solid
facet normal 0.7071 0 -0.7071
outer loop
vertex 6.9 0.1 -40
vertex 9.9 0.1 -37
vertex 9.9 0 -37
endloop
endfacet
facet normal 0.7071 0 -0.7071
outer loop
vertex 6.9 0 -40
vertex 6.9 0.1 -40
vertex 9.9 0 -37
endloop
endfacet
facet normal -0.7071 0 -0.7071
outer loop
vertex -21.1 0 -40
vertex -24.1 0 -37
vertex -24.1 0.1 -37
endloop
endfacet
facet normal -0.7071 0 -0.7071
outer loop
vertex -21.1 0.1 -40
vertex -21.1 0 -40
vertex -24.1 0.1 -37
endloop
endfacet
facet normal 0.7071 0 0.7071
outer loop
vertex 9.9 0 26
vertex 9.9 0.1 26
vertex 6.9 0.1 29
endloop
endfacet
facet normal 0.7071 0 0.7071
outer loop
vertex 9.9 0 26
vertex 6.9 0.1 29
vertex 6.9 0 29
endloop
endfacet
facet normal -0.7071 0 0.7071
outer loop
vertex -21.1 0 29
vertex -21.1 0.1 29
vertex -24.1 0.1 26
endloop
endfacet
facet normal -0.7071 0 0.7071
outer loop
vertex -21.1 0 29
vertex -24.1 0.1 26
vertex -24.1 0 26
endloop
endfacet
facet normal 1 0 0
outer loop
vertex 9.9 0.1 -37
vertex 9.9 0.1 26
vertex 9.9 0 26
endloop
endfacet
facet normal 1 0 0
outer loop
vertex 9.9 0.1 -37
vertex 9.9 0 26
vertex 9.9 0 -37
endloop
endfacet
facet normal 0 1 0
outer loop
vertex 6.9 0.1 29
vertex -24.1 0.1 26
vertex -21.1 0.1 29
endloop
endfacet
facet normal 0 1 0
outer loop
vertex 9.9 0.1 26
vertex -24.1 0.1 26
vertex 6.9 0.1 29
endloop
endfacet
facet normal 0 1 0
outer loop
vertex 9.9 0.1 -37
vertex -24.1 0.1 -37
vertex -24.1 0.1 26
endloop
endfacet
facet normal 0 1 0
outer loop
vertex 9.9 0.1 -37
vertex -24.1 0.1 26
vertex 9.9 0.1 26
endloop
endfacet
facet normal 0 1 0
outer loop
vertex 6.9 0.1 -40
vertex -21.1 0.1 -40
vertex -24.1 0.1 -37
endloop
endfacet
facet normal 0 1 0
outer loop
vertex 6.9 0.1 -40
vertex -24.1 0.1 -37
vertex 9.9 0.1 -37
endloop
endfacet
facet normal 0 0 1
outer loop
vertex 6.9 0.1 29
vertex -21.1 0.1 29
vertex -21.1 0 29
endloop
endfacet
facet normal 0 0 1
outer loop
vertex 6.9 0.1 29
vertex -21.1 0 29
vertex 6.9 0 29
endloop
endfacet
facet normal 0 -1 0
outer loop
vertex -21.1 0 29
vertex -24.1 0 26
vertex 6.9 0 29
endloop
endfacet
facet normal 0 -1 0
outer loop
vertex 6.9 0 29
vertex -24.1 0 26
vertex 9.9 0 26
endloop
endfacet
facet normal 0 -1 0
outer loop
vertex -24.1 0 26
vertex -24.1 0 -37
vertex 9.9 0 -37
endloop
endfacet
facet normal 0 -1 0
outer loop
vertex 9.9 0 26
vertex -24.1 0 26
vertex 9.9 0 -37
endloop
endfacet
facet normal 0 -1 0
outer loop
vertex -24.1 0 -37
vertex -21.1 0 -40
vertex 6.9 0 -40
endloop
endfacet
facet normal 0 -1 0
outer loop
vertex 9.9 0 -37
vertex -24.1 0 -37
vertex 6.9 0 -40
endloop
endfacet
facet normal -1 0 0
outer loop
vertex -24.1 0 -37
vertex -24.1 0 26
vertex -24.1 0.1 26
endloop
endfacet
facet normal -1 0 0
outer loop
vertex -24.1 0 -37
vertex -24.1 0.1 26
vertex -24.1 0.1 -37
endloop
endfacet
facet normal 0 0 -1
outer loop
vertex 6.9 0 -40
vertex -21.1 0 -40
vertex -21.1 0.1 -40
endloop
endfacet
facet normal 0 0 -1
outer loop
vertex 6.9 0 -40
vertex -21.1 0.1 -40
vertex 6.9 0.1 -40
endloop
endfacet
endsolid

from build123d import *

# Parameters (mm, degrees)
SKETCH1_W           = 48.2
SKETCH1_H           = 80
BOSS_EXTRUDE1_DEPTH = 0.1
CUT_EXTRUDE1_DEPTH  = 1.1
CHAMFER1_SIZE       = 3


with BuildPart() as part:
    # Sketch1 → Boss-Extrude1 (new body)
    with BuildSketch(Plane(origin=(0, 0, 0), x_dir=(1, 0, 0), z_dir=(0, 1, 0))):
        Rectangle(SKETCH1_W, SKETCH1_H)
    extrude(amount=BOSS_EXTRUDE1_DEPTH)

    # Sketch2 → Cut-Extrude1 (cut, through all)
    with BuildSketch(Plane(origin=(0, 0.1, 0), x_dir=(1, 0, 0), z_dir=(0, 1, 0))):
        Polygon((9.9, 40), (24.1, 40), (24.1, -40), (-24.1, -40), (-24.1, -29), (9.9, -29), align=None)
    extrude(amount=-CUT_EXTRUDE1_DEPTH, mode=Mode.SUBTRACT)

    # Chamfer1
    chamfer1_edges = [part.edges().sort_by_distance(p)[0] for p in [
        (9.9, 0.05, 29),
        (9.9, 0.05, -40),
        (-24.1, 0.05, 29),
        (-24.1, 0.05, -40),
    ]]
    chamfer(chamfer1_edges, length=CHAMFER1_SIZE)


solid = part.part
